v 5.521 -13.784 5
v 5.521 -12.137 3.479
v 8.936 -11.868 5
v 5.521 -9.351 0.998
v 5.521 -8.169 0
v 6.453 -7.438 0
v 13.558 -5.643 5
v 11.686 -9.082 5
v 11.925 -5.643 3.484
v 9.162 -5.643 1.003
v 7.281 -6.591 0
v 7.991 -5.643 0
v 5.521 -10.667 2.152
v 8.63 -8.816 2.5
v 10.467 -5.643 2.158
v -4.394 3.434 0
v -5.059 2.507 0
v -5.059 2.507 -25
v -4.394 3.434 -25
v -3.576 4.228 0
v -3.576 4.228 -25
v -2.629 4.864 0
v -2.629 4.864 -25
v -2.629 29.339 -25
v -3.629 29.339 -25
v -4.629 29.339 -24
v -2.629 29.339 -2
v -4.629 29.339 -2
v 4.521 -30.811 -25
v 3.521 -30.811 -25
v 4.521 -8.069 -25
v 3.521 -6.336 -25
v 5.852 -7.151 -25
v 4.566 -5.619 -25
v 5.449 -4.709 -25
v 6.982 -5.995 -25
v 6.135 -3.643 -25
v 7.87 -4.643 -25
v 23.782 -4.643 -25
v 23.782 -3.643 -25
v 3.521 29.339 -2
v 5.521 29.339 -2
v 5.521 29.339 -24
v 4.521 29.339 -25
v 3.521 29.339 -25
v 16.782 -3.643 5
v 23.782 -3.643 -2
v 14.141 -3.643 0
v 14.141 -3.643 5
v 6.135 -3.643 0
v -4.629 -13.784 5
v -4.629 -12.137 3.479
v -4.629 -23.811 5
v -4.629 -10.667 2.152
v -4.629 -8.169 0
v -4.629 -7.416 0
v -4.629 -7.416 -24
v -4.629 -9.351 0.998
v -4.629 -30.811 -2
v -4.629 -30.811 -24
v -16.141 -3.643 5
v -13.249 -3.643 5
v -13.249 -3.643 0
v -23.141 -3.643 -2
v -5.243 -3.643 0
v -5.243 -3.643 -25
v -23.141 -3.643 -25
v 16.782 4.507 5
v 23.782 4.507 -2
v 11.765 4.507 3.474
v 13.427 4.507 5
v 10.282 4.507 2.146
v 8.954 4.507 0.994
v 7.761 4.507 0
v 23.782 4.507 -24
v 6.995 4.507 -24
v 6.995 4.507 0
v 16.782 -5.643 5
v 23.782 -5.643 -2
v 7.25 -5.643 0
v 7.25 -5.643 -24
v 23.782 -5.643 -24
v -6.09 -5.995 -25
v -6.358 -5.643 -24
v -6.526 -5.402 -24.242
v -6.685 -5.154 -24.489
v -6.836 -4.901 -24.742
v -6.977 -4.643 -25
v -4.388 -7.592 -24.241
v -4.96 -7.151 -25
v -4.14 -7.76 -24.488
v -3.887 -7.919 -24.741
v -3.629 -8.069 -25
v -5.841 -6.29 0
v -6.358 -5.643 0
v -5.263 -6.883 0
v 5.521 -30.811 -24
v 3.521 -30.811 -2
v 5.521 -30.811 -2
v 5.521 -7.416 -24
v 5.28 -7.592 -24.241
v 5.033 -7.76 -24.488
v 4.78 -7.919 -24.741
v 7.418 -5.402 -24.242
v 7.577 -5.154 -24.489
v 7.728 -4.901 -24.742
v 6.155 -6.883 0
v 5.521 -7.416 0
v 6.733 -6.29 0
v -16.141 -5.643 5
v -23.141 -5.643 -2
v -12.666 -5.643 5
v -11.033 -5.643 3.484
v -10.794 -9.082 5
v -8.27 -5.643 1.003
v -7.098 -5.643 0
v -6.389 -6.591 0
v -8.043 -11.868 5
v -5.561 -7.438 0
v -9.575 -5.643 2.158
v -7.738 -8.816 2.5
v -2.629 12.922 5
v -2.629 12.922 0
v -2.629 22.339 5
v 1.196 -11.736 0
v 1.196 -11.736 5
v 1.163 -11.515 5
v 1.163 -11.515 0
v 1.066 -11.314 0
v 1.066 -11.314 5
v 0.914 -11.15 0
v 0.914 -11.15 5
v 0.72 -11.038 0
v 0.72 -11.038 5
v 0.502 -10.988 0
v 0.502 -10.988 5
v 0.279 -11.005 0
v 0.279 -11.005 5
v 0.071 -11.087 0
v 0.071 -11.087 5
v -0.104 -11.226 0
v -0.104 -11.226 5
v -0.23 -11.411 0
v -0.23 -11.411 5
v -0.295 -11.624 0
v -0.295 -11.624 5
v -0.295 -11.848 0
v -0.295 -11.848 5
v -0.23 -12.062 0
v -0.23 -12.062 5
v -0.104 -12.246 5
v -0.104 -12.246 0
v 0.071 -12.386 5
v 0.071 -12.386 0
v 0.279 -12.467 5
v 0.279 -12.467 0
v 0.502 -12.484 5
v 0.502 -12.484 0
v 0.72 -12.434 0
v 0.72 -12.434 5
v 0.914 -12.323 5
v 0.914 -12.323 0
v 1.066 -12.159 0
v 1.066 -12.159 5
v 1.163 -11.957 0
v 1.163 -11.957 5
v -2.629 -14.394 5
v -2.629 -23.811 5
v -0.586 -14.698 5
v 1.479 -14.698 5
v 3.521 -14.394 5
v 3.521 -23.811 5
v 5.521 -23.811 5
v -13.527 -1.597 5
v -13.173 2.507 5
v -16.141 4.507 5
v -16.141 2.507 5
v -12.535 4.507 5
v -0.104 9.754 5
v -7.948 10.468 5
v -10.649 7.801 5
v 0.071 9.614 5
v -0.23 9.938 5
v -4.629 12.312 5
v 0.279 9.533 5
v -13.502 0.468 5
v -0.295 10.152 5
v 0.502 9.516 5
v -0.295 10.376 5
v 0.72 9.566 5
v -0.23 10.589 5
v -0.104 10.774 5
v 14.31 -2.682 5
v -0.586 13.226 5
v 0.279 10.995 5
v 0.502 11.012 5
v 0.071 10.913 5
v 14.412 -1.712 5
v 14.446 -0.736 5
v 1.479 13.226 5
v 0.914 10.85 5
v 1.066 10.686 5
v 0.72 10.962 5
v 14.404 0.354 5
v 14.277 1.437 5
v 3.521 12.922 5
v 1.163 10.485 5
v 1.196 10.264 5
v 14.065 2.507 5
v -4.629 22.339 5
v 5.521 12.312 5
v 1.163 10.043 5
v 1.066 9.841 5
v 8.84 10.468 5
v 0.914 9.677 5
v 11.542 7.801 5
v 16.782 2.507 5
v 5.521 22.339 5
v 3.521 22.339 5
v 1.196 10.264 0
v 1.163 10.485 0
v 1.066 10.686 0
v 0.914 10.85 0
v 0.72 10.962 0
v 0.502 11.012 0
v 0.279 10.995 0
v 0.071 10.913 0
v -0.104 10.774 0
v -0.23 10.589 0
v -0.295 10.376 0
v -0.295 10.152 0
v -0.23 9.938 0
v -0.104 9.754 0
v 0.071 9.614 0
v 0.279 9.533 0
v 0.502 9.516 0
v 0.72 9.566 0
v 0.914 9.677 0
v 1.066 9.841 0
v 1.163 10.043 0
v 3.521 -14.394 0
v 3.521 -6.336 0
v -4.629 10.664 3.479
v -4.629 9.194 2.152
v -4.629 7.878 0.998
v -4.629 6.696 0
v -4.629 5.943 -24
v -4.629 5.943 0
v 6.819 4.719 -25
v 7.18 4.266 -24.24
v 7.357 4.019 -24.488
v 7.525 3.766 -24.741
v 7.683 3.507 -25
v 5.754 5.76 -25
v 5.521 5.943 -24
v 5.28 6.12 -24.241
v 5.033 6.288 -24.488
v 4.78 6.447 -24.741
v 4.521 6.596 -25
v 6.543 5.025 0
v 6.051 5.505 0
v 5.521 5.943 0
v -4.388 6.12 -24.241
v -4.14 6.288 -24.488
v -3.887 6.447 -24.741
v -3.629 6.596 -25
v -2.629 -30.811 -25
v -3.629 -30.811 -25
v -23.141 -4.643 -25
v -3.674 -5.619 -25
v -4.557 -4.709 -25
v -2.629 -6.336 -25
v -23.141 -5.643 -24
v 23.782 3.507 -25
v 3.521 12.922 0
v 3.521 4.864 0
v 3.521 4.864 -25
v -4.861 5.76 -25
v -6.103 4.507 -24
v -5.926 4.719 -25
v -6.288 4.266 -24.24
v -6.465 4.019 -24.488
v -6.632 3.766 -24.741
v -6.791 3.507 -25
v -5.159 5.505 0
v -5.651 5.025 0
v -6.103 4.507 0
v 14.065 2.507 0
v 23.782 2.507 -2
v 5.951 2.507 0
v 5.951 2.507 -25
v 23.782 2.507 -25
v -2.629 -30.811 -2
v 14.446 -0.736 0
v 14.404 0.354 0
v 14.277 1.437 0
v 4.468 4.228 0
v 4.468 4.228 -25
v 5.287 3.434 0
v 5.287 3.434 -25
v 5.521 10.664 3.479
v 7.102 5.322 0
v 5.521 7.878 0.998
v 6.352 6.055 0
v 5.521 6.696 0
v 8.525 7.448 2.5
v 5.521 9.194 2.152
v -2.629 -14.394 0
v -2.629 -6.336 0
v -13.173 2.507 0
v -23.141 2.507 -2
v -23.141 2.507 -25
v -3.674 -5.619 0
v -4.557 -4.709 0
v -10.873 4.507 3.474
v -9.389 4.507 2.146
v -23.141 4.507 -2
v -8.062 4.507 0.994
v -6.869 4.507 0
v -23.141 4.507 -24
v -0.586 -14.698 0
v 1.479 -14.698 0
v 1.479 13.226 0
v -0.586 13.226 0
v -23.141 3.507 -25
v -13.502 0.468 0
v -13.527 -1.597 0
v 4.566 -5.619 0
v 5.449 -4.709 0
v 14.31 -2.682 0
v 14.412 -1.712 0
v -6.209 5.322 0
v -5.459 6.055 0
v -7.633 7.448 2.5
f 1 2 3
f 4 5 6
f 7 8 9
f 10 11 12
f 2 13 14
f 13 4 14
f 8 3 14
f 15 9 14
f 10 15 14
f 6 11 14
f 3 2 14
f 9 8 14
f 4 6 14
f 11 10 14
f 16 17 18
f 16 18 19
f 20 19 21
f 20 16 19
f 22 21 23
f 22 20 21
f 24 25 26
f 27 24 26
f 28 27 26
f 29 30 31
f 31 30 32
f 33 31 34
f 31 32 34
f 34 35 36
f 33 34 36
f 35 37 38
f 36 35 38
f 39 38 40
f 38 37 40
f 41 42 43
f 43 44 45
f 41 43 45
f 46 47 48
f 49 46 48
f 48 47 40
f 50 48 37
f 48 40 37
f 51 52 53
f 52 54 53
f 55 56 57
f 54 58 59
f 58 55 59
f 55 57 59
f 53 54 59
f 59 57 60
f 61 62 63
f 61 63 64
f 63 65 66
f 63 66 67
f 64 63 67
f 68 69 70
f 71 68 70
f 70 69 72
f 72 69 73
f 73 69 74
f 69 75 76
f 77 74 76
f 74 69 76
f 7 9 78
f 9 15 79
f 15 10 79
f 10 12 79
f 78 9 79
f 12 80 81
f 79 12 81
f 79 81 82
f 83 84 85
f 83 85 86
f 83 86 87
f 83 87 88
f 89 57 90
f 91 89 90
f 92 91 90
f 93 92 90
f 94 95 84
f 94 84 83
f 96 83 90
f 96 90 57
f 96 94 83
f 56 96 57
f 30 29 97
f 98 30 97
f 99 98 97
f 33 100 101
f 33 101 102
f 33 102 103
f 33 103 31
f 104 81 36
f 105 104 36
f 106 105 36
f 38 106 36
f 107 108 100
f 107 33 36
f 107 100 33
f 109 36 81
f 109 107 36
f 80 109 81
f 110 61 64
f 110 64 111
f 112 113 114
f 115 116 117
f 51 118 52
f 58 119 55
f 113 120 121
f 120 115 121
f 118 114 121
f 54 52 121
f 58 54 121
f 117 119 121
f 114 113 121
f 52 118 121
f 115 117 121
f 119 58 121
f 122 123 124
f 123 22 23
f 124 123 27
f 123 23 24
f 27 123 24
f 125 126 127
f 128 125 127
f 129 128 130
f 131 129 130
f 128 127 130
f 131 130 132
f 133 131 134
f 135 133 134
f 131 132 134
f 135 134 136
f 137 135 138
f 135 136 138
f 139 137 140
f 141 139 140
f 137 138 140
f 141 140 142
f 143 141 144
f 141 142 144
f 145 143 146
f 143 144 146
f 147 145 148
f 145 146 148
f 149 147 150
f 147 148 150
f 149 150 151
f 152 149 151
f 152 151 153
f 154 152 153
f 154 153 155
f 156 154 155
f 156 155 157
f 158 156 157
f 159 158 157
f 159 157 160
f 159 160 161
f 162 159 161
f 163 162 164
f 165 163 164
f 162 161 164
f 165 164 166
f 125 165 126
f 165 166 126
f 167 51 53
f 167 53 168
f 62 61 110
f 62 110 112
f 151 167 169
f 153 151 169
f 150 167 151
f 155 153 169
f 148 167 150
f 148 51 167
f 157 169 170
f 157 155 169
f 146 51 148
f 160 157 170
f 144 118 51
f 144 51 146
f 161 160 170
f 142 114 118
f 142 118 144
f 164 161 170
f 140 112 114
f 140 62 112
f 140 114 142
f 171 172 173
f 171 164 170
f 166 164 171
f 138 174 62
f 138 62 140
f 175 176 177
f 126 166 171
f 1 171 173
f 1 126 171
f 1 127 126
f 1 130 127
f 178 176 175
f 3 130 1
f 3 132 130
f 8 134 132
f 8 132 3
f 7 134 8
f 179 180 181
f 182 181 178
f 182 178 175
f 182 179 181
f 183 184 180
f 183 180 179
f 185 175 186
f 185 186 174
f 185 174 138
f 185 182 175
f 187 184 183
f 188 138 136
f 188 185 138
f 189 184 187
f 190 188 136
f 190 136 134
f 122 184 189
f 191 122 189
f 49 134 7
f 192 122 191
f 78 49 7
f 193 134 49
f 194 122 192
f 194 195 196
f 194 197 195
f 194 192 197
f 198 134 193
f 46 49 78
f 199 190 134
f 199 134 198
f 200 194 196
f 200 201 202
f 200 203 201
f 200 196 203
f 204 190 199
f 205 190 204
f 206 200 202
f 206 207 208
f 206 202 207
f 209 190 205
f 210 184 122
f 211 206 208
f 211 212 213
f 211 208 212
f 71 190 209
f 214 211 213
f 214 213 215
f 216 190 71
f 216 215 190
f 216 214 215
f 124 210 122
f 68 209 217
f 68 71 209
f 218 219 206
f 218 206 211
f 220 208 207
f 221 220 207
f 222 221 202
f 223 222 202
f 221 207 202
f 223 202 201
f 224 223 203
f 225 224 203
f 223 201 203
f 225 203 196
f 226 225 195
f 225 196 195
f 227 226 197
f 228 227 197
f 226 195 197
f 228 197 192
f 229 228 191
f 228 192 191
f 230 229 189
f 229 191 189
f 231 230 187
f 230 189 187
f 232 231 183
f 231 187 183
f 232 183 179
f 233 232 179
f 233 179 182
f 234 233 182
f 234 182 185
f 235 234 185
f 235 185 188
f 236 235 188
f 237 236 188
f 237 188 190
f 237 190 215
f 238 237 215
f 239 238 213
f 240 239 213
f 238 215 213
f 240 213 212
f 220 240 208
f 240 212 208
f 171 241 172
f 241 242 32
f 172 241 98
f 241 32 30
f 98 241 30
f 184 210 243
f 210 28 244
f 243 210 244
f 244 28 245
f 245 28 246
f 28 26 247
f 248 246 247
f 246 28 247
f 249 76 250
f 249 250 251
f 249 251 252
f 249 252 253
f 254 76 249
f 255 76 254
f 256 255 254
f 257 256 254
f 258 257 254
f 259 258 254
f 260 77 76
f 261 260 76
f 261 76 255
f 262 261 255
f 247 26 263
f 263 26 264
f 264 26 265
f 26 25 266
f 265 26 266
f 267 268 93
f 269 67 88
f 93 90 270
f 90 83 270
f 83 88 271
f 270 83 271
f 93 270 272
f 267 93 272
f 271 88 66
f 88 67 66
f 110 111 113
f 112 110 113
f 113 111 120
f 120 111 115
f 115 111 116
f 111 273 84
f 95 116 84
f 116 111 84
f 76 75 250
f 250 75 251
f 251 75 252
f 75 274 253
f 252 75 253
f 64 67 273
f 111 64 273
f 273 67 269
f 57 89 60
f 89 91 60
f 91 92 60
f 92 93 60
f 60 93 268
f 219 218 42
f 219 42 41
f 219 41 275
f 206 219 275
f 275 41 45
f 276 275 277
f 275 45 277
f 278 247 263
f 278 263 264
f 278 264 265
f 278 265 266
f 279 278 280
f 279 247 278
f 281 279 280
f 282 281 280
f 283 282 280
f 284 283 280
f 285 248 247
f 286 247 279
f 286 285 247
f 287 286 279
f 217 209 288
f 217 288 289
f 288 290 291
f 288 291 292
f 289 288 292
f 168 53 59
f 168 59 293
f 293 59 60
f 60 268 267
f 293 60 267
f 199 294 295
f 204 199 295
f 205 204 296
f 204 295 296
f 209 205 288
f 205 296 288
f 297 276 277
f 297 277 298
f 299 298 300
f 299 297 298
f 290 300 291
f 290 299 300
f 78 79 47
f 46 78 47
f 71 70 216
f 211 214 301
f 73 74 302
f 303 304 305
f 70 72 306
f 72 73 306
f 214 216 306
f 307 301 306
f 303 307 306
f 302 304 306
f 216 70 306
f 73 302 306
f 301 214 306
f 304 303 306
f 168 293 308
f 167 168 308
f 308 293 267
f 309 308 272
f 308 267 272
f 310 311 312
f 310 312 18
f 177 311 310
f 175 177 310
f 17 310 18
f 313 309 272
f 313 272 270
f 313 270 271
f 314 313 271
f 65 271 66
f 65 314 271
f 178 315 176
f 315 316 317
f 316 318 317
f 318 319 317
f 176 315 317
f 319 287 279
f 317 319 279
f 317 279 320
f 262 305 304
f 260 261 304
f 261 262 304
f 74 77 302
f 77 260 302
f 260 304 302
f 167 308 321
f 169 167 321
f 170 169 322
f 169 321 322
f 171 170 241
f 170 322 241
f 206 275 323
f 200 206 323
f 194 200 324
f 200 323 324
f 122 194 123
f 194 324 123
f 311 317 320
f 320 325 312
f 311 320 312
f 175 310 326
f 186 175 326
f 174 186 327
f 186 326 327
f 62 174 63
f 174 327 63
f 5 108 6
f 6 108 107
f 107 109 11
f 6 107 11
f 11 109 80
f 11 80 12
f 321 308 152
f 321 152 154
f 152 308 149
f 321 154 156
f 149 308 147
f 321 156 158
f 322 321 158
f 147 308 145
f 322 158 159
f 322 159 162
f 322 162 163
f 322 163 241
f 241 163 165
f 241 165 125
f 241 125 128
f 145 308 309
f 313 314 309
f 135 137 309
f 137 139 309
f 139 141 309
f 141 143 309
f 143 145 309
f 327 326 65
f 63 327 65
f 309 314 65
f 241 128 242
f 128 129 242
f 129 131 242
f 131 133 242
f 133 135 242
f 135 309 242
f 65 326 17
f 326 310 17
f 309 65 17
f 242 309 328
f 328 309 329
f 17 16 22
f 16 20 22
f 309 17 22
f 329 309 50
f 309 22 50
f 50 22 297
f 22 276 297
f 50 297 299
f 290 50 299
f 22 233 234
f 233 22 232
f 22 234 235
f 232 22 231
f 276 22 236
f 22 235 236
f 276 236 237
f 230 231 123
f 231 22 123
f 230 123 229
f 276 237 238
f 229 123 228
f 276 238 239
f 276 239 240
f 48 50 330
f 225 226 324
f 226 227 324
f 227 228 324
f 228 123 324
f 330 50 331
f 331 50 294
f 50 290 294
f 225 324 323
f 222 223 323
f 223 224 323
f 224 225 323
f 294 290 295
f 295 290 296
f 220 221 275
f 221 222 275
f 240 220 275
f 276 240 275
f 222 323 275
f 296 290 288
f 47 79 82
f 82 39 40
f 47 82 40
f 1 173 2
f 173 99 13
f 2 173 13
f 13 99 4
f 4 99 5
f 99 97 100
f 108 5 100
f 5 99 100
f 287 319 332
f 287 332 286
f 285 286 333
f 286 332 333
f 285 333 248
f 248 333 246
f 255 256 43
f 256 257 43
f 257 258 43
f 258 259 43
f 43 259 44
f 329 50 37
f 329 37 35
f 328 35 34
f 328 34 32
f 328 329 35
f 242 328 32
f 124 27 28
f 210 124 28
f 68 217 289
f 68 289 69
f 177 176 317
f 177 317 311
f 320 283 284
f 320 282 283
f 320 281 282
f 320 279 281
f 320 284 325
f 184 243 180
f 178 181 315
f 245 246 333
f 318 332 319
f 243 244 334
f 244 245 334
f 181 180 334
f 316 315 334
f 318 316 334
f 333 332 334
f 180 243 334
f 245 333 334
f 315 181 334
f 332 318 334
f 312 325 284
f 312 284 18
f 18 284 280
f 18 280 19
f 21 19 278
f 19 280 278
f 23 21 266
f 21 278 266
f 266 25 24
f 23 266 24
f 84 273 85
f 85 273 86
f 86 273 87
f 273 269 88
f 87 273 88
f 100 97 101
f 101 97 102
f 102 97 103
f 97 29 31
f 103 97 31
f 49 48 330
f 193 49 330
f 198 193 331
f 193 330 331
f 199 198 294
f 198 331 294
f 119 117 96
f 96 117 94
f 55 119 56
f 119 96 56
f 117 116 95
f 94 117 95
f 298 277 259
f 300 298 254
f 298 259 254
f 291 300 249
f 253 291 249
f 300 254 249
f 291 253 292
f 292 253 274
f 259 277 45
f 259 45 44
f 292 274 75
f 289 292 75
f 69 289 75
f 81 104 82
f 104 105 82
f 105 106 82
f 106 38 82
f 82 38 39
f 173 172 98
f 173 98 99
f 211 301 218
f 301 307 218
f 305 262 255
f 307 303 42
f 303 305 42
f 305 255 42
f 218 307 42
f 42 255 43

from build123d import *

# Parameters (mm, degrees)
F1_DEPTH = 25
F2_W     = 6.15
F2_H     = 2
F2_W_2   = 2
F2_H_2   = 6.15
F3_DEPTH = 25
F5_DEPTH = 5
F6_R     = 0.75
F7_DEPTH = 5
F8_DEPTH = 5
F9_SIZE  = 7
F10_SIZE = 4.99999
F11_SIZE = 1


# Not quite as in the source:
# - a fillet or chamfer is up to 0.001 mm smaller than in the source, because OpenCascade refuses the exact size


with BuildPart() as f1:
    # F0 (on Top) → F1 (new body)
    with BuildSketch(Plane.XY):
        with BuildLine():
            Line((5.5211611295, 29.3387952344), (-4.6288388705, 29.3387952344))
            Line((-4.6288388705, 29.3387952344), (-4.6288388705, 5.9433882713))
            ThreePointArc((-4.6288388705, 5.9433882713), (-5.4099272548, 5.2703597245), (-6.1025520558, 4.5065944634))
            Line((-6.1025520558, 4.5065944634), (-23.141437278, 4.5065944634))
            Line((-23.141437278, 4.5065944634), (-23.141437278, -5.6434055366))
            Line((-23.141437278, -5.6434055366), (-6.3576590277, -5.6434055366))
            ThreePointArc((-6.3576590277, -5.6434055366), (-5.5589979581, -6.5937343191), (-4.6288388705, -7.4157978024))
            Line((-4.6288388705, -7.4157978024), (-4.6288388705, -30.8112047656))
            Line((-4.6288388705, -30.8112047656), (5.5211611295, -30.8112047656))
            Line((5.5211611295, -30.8112047656), (5.5211611295, -7.4157978024))
            ThreePointArc((5.5211611295, -7.4157978024), (6.4513202171, -6.5937343191), (7.2499812866, -5.6434055366))
            Line((7.2499812866, -5.6434055366), (23.7822366705, -5.6434055366))
            Line((23.7822366705, -5.6434055366), (23.7822366705, 4.5065944634))
            Line((23.7822366705, 4.5065944634), (6.9948743147, 4.5065944634))
            ThreePointArc((6.9948743147, 4.5065944634), (6.3022495138, 5.2703597245), (5.5211611295, 5.9433882713))
            Line((5.5211611295, 5.9433882713), (5.5211611295, 29.3387952344))
        make_face()
        with BuildLine():
            Line((-2.6288388705, 4.8639394003), (-2.6288388705, 27.3387952344))
            Line((-2.6288388705, 27.3387952344), (3.5211611295, 27.3387952344))
            Line((3.5211611295, 27.3387952344), (3.5211611295, 4.8639394003))
            ThreePointArc((3.5211611295, 4.8639394003), (4.8949803528, 3.8491247969), (5.9508403063, 2.5065944634))
            Line((5.9508403063, 2.5065944634), (21.7822366705, 2.5065944634))
            Line((21.7822366705, 2.5065944634), (21.7822366705, -3.6434055366))
            Line((21.7822366705, -3.6434055366), (6.1352228584, -3.6434055366))
            ThreePointArc((6.1352228584, -3.6434055366), (5.0303928567, -5.1861552316), (3.5211611295, -6.3363489315))
            Line((3.5211611295, -6.3363489315), (3.5211611295, -28.8112047656))
            Line((3.5211611295, -28.8112047656), (-2.6288388705, -28.8112047656))
            Line((-2.6288388705, -28.8112047656), (-2.6288388705, -6.3363489315))
            ThreePointArc((-2.6288388705, -6.3363489315), (-4.1380705978, -5.1861552316), (-5.2429005995, -3.6434055366))
            Line((-5.2429005995, -3.6434055366), (-21.141437278, -3.6434055366))
            Line((-21.141437278, -3.6434055366), (-21.141437278, 2.5065944634))
            Line((-21.141437278, 2.5065944634), (-5.0585180473, 2.5065944634))
            ThreePointArc((-5.0585180473, 2.5065944634), (-4.0026580939, 3.8491247969), (-2.6288388705, 4.8639394003))
        make_face(mode=Mode.SUBTRACT)
    extrude(amount=-F1_DEPTH)

    # F2 (on face) → F3 (cut, through all)
    with BuildSketch(Plane.XY):
        with Locations((0.4461611295, 28.3387952344)):
            Rectangle(F2_W, F2_H)
        with Locations((-22.141437278, -0.5684055366)):
            Rectangle(F2_W_2, F2_H_2)
        with Locations((22.7822366705, -0.5684055366)):
            Rectangle(F2_W_2, F2_H_2)
        with Locations((0.4461611295, -29.8112047656)):
            Rectangle(F2_W, F2_H)
    extrude(amount=-F3_DEPTH, mode=Mode.SUBTRACT)

    # F4 (on Top) → F5 (join)
    with BuildSketch(Plane.XY):
        with BuildLine():
            Line((3.5211611295, 4.8639394003), (3.5211611295, 12.9219201057))
            ThreePointArc((3.5211611295, 12.9219201057), (0.4461611295, 13.2637952344), (-2.6288388705, 12.9219201057))
            Line((-2.6288388705, 12.9219201057), (-2.6288388705, 4.8639394003))
            ThreePointArc((-2.6288388705, 4.8639394003), (-4.0026580939, 3.8491247969), (-5.0585180473, 2.5065944634))
            Line((-5.0585180473, 2.5065944634), (-13.1730992455, 2.5065944634))
            ThreePointArc((-13.1730992455, 2.5065944634), (-13.5527822586, -0.5642047132), (-13.2486621142, -3.6434055366))
            Line((-13.2486621142, -3.6434055366), (-5.2429005995, -3.6434055366))
            ThreePointArc((-5.2429005995, -3.6434055366), (-4.1380705978, -5.1861552316), (-2.6288388705, -6.3363489315))
            Line((-2.6288388705, -6.3363489315), (-2.6288388705, -14.3943296369))
            ThreePointArc((-2.6288388705, -14.3943296369), (0.4461611295, -14.7362047656), (3.5211611295, -14.3943296369))
            Line((3.5211611295, -14.3943296369), (3.5211611295, -6.3363489315))
            ThreePointArc((3.5211611295, -6.3363489315), (5.0303928567, -5.1861552316), (6.1352228584, -3.6434055366))
            Line((6.1352228584, -3.6434055366), (14.1409843732, -3.6434055366))
            ThreePointArc((14.1409843732, -3.6434055366), (14.3696579139, -2.1977920171), (14.4461611295, -0.7362047656))
            ThreePointArc((14.4461611295, -0.7362047656), (14.350650427, 0.8963323321), (14.0654215044, 2.5065944634))
            Line((14.0654215044, 2.5065944634), (5.9508403063, 2.5065944634))
            ThreePointArc((5.9508403063, 2.5065944634), (4.8949803528, 3.8491247969), (3.5211611295, 4.8639394003))
        make_face()
        with BuildLine():
            ThreePointArc((13.5579642318, -5.6434055366), (13.8867267431, -4.6542649982), (14.1409843732, -3.6434055366))
            Line((14.1409843732, -3.6434055366), (6.1352228584, -3.6434055366))
            ThreePointArc((6.1352228584, -3.6434055366), (5.0303928567, -5.1861552316), (3.5211611295, -6.3363489315))
            Line((3.5211611295, -6.3363489315), (3.5211611295, -14.3943296369))
            ThreePointArc((3.5211611295, -14.3943296369), (4.5325724418, -14.1265461573), (5.5211611295, -13.783977564))
            Line((5.5211611295, -13.783977564), (5.5211611295, -7.4157978024))
            ThreePointArc((5.5211611295, -7.4157978024), (6.4513202171, -6.5937343191), (7.2499812866, -5.6434055366))
            Line((7.2499812866, -5.6434055366), (13.5579642318, -5.6434055366))
        make_face()
        with BuildLine():
            Line((-4.6288388705, 5.9433882713), (-4.6288388705, 12.3115680329))
            ThreePointArc((-4.6288388705, 12.3115680329), (-9.3893111671, 9.2269014119), (-12.5350967543, 4.5065944634))
            Line((-12.5350967543, 4.5065944634), (-6.1025520558, 4.5065944634))
            ThreePointArc((-6.1025520558, 4.5065944634), (-5.4099272548, 5.2703597245), (-4.6288388705, 5.9433882713))
        make_face()
        with BuildLine():
            Line((-2.6288388705, 4.8639394003), (-2.6288388705, 12.9219201057))
            ThreePointArc((-2.6288388705, 12.9219201057), (-3.6402501828, 12.6541366261), (-4.6288388705, 12.3115680329))
            Line((-4.6288388705, 12.3115680329), (-4.6288388705, 5.9433882713))
            ThreePointArc((-4.6288388705, 5.9433882713), (-5.4099272548, 5.2703597245), (-6.1025520558, 4.5065944634))
            Line((-6.1025520558, 4.5065944634), (-12.5350967543, 4.5065944634))
            ThreePointArc((-12.5350967543, 4.5065944634), (-12.8916382733, 3.5185698574), (-13.1730992455, 2.5065944634))
            Line((-13.1730992455, 2.5065944634), (-5.0585180473, 2.5065944634))
            ThreePointArc((-5.0585180473, 2.5065944634), (-4.0026580939, 3.8491247969), (-2.6288388705, 4.8639394003))
        make_face()
        with BuildLine():
            ThreePointArc((13.4274190132, 4.5065944634), (10.281633426, 9.2269014119), (5.5211611295, 12.3115680329))
            Line((5.5211611295, 12.3115680329), (5.5211611295, 5.9433882713))
            ThreePointArc((5.5211611295, 5.9433882713), (6.3022495138, 5.2703597245), (6.9948743147, 4.5065944634))
            Line((6.9948743147, 4.5065944634), (13.4274190132, 4.5065944634))
        make_face()
        with BuildLine():
            Line((5.5211611295, 5.9433882713), (5.5211611295, 12.3115680329))
            ThreePointArc((5.5211611295, 12.3115680329), (4.5325724418, 12.6541366261), (3.5211611295, 12.9219201057))
            Line((3.5211611295, 12.9219201057), (3.5211611295, 4.8639394003))
            ThreePointArc((3.5211611295, 4.8639394003), (4.8949803528, 3.8491247969), (5.9508403063, 2.5065944634))
            Line((5.9508403063, 2.5065944634), (14.0654215044, 2.5065944634))
            ThreePointArc((14.0654215044, 2.5065944634), (13.7839605322, 3.5185698574), (13.4274190132, 4.5065944634))
            Line((13.4274190132, 4.5065944634), (6.9948743147, 4.5065944634))
            ThreePointArc((6.9948743147, 4.5065944634), (6.3022495138, 5.2703597245), (5.5211611295, 5.9433882713))
        make_face()
        with BuildLine():
            ThreePointArc((5.5211611295, -13.783977564), (10.4089508996, -10.5719975652), (13.5579642318, -5.6434055366))
            Line((13.5579642318, -5.6434055366), (7.2499812866, -5.6434055366))
            ThreePointArc((7.2499812866, -5.6434055366), (6.4513202171, -6.5937343191), (5.5211611295, -7.4157978024))
            Line((5.5211611295, -7.4157978024), (5.5211611295, -13.783977564))
        make_face()
        with BuildLine():
            Line((-6.3576590277, -5.6434055366), (-12.6656419728, -5.6434055366))
            ThreePointArc((-12.6656419728, -5.6434055366), (-9.5166286406, -10.5719975652), (-4.6288388705, -13.783977564))
            Line((-4.6288388705, -13.783977564), (-4.6288388705, -7.4157978024))
            ThreePointArc((-4.6288388705, -7.4157978024), (-5.5589979581, -6.5937343191), (-6.3576590277, -5.6434055366))
        make_face()
        with BuildLine():
            Line((-5.2429005995, -3.6434055366), (-13.2486621142, -3.6434055366))
            ThreePointArc((-13.2486621142, -3.6434055366), (-12.9944044841, -4.6542649982), (-12.6656419728, -5.6434055366))
            Line((-12.6656419728, -5.6434055366), (-6.3576590277, -5.6434055366))
            ThreePointArc((-6.3576590277, -5.6434055366), (-5.5589979581, -6.5937343191), (-4.6288388705, -7.4157978024))
            Line((-4.6288388705, -7.4157978024), (-4.6288388705, -13.783977564))
            ThreePointArc((-4.6288388705, -13.783977564), (-3.6402501828, -14.1265461573), (-2.6288388705, -14.3943296369))
            Line((-2.6288388705, -14.3943296369), (-2.6288388705, -6.3363489315))
            ThreePointArc((-2.6288388705, -6.3363489315), (-4.1380705978, -5.1861552316), (-5.2429005995, -3.6434055366))
        make_face()
    extrude(amount=F5_DEPTH)

    # F6 (on face) → F7 (cut, through all)
    with BuildSketch(Plane.XY.offset(5)):
        with Locations((0.4461611295, 10.2637952344)):
            Circle(F6_R)
        with Locations((0.4461611295, -11.7362047656)):
            Circle(F6_R)
    extrude(amount=-F7_DEPTH, mode=Mode.SUBTRACT)

    # F8 (add): faces of the model
    f8_faces = [f1.faces().sort_by_distance(p)[0] for p in [
        (-3.6349246548, 20.9904665399, 0),
        (4.5272469138, 20.9904665399, 0),
        (18.7764211463, 3.5172058862, 0),
        (18.8278982695, -4.6532031137, 0),
        (-18.0099019482, 3.5169457421, 0),
        (-18.0613729447, -4.6529604993, 0),
        (-3.6349246548, -22.4628760711, 0),
        (4.5272469138, -22.4628760711, 0),
    ]]
    extrude(f8_faces, amount=F8_DEPTH)

    # F9
    f9_edges = [f1.edges().sort_by_distance(p)[0] for p in [
        (-23.141437, 3.506594, 5),
        (-23.141437, -4.643406, 5),
        (-3.628839, -30.811205, 5),
        (4.521161, -30.811205, 5),
        (23.782237, -4.643406, 5),
        (23.782237, 3.506594, 5),
        (-3.628839, 29.338795, 5),
        (4.521161, 29.338795, 5),
    ]]
    chamfer(f9_edges, length=F9_SIZE)

    # F10 (size 5 in the source; OpenCascade refuses exactly that, so slightly less here)
    f10_edges = [f1.edges().sort_by_distance(p)[0] for p in [
        (10.281633, 9.226901, 0),
        (-9.389311, 9.226901, 0),
        (10.408951, -10.571998, 0),
        (-9.516629, -10.571998, 0),
    ]]
    chamfer(f10_edges, length=F10_SIZE)

    # F11
    f11_edges = [f1.edges().sort_by_distance(p)[0] for p in [
        (15.388555, 4.506594, -25),
        (5.521161, 17.641092, -25),
        (-4.628839, 17.641092, -25),
        (-14.621995, 4.506594, -25),
        (-14.749548, -5.643406, -25),
        (-4.628839, -19.113501, -25),
        (5.521161, -19.113501, -25),
        (15.516109, -5.643406, -25),
    ]]
    chamfer(f11_edges, length=F11_SIZE)


solid = f1.part
